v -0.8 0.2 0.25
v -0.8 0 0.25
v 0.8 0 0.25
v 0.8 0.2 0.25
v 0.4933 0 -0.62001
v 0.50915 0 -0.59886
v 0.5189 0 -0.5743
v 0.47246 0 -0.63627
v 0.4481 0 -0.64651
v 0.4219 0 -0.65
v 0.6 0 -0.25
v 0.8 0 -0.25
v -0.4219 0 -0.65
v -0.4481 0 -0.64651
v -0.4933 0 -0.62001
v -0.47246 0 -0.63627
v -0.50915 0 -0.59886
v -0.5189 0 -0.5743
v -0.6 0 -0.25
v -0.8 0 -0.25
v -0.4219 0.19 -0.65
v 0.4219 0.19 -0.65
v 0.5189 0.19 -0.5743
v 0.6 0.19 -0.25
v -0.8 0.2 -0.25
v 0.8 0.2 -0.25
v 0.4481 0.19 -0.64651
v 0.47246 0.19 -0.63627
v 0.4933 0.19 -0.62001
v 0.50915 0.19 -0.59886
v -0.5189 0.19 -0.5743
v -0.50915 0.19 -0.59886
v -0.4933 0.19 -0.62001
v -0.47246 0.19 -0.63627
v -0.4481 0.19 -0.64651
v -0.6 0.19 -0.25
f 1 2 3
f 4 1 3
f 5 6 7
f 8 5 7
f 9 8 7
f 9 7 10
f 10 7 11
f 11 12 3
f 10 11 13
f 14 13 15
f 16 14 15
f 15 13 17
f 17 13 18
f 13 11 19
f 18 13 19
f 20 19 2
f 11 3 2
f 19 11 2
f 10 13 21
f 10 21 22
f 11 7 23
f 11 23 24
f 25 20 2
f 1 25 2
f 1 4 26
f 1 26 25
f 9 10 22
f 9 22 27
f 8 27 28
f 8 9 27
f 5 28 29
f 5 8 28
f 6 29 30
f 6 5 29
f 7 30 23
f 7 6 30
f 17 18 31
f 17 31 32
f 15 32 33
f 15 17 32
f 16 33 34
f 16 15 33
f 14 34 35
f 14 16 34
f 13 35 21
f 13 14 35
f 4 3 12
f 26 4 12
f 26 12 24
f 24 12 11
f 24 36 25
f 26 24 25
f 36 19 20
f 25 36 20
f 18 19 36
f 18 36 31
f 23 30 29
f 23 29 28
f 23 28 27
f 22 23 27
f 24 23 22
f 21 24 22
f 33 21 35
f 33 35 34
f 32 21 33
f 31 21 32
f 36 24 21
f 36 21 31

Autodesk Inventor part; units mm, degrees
ref_plane "YZ Plane" through (0, 0, 0) normal (1, 0, 0) x (0, 1, 0)
ref_plane "XZ Plane" through (0, 0, 0) normal (0, 1, 0) x (-1, 0, 0)
ref_plane "XY Plane" through (0, 0, 0) normal (0, 0, 1) x (1, 0, 0)
sketch "Sketch1" plane through (0, 0, 0) normal (0, 1, 0) x (-1, 0, 0)
  line L0 (0.8, 0.25) -> (-0.8, 0.25)
  line L1 (-0.8, 0.25) -> (-0.8, -0.25)
  line L2 (-0.8, -0.25) -> (0.8, -0.25)
  line L3 (0.8, -0.25) -> (0.8, 0.25)
  line L4 (0.8, 0.25) -> (-0.8, -0.25) construction
  line L5 (-0.8, 0.25) -> (0.8, -0.25) construction
  point P0 (0, 0)
  dimension "d0" = 0.5
  dimension "d1" = 1.6
extrude "Extrusion1" add sketch "Sketch1" along normal blind 0.2
sketch "Sketch2" plane through (0, 0, 0) normal (0, 1, 0) x (-1, 0, 0)
  line L0 (-0.8, -0.25) -> (0.8, -0.25) projected
  line L1 (0.6, -0.25) -> (0.5189, -0.5743)
  line L2 (0.4219, -0.65) -> (-0.4219, -0.65)
  line L3 (-0.5189, -0.5743) -> (-0.6, -0.25)
  line L4 (0.8, 0.25) -> (-0.8, 0.25) projected
  line L5 (0.6, -0.25) -> (-0.6, -0.25)
  arc A0 (0.4219, -0.65) -> (0.5189, -0.5743) centre (0.4219, -0.55) ccw
  arc A1 (-0.5189, -0.5743) -> (-0.4219, -0.65) centre (-0.4219, -0.55) ccw
  point P0 (0, 0)
  point P1 (0.5, -0.65)
  point P2 (-0.5, -0.65)
  point P3 (0, -0.25)
  dimension "d4" = 0.9
  dimension "d6" = 1.2
  dimension "d7" = 1
  dimension "d8" = 0.1
extrude "Extrusion2" add sketch "Sketch2" along normal blind 0.19
properties part number "RightAngleLED"
